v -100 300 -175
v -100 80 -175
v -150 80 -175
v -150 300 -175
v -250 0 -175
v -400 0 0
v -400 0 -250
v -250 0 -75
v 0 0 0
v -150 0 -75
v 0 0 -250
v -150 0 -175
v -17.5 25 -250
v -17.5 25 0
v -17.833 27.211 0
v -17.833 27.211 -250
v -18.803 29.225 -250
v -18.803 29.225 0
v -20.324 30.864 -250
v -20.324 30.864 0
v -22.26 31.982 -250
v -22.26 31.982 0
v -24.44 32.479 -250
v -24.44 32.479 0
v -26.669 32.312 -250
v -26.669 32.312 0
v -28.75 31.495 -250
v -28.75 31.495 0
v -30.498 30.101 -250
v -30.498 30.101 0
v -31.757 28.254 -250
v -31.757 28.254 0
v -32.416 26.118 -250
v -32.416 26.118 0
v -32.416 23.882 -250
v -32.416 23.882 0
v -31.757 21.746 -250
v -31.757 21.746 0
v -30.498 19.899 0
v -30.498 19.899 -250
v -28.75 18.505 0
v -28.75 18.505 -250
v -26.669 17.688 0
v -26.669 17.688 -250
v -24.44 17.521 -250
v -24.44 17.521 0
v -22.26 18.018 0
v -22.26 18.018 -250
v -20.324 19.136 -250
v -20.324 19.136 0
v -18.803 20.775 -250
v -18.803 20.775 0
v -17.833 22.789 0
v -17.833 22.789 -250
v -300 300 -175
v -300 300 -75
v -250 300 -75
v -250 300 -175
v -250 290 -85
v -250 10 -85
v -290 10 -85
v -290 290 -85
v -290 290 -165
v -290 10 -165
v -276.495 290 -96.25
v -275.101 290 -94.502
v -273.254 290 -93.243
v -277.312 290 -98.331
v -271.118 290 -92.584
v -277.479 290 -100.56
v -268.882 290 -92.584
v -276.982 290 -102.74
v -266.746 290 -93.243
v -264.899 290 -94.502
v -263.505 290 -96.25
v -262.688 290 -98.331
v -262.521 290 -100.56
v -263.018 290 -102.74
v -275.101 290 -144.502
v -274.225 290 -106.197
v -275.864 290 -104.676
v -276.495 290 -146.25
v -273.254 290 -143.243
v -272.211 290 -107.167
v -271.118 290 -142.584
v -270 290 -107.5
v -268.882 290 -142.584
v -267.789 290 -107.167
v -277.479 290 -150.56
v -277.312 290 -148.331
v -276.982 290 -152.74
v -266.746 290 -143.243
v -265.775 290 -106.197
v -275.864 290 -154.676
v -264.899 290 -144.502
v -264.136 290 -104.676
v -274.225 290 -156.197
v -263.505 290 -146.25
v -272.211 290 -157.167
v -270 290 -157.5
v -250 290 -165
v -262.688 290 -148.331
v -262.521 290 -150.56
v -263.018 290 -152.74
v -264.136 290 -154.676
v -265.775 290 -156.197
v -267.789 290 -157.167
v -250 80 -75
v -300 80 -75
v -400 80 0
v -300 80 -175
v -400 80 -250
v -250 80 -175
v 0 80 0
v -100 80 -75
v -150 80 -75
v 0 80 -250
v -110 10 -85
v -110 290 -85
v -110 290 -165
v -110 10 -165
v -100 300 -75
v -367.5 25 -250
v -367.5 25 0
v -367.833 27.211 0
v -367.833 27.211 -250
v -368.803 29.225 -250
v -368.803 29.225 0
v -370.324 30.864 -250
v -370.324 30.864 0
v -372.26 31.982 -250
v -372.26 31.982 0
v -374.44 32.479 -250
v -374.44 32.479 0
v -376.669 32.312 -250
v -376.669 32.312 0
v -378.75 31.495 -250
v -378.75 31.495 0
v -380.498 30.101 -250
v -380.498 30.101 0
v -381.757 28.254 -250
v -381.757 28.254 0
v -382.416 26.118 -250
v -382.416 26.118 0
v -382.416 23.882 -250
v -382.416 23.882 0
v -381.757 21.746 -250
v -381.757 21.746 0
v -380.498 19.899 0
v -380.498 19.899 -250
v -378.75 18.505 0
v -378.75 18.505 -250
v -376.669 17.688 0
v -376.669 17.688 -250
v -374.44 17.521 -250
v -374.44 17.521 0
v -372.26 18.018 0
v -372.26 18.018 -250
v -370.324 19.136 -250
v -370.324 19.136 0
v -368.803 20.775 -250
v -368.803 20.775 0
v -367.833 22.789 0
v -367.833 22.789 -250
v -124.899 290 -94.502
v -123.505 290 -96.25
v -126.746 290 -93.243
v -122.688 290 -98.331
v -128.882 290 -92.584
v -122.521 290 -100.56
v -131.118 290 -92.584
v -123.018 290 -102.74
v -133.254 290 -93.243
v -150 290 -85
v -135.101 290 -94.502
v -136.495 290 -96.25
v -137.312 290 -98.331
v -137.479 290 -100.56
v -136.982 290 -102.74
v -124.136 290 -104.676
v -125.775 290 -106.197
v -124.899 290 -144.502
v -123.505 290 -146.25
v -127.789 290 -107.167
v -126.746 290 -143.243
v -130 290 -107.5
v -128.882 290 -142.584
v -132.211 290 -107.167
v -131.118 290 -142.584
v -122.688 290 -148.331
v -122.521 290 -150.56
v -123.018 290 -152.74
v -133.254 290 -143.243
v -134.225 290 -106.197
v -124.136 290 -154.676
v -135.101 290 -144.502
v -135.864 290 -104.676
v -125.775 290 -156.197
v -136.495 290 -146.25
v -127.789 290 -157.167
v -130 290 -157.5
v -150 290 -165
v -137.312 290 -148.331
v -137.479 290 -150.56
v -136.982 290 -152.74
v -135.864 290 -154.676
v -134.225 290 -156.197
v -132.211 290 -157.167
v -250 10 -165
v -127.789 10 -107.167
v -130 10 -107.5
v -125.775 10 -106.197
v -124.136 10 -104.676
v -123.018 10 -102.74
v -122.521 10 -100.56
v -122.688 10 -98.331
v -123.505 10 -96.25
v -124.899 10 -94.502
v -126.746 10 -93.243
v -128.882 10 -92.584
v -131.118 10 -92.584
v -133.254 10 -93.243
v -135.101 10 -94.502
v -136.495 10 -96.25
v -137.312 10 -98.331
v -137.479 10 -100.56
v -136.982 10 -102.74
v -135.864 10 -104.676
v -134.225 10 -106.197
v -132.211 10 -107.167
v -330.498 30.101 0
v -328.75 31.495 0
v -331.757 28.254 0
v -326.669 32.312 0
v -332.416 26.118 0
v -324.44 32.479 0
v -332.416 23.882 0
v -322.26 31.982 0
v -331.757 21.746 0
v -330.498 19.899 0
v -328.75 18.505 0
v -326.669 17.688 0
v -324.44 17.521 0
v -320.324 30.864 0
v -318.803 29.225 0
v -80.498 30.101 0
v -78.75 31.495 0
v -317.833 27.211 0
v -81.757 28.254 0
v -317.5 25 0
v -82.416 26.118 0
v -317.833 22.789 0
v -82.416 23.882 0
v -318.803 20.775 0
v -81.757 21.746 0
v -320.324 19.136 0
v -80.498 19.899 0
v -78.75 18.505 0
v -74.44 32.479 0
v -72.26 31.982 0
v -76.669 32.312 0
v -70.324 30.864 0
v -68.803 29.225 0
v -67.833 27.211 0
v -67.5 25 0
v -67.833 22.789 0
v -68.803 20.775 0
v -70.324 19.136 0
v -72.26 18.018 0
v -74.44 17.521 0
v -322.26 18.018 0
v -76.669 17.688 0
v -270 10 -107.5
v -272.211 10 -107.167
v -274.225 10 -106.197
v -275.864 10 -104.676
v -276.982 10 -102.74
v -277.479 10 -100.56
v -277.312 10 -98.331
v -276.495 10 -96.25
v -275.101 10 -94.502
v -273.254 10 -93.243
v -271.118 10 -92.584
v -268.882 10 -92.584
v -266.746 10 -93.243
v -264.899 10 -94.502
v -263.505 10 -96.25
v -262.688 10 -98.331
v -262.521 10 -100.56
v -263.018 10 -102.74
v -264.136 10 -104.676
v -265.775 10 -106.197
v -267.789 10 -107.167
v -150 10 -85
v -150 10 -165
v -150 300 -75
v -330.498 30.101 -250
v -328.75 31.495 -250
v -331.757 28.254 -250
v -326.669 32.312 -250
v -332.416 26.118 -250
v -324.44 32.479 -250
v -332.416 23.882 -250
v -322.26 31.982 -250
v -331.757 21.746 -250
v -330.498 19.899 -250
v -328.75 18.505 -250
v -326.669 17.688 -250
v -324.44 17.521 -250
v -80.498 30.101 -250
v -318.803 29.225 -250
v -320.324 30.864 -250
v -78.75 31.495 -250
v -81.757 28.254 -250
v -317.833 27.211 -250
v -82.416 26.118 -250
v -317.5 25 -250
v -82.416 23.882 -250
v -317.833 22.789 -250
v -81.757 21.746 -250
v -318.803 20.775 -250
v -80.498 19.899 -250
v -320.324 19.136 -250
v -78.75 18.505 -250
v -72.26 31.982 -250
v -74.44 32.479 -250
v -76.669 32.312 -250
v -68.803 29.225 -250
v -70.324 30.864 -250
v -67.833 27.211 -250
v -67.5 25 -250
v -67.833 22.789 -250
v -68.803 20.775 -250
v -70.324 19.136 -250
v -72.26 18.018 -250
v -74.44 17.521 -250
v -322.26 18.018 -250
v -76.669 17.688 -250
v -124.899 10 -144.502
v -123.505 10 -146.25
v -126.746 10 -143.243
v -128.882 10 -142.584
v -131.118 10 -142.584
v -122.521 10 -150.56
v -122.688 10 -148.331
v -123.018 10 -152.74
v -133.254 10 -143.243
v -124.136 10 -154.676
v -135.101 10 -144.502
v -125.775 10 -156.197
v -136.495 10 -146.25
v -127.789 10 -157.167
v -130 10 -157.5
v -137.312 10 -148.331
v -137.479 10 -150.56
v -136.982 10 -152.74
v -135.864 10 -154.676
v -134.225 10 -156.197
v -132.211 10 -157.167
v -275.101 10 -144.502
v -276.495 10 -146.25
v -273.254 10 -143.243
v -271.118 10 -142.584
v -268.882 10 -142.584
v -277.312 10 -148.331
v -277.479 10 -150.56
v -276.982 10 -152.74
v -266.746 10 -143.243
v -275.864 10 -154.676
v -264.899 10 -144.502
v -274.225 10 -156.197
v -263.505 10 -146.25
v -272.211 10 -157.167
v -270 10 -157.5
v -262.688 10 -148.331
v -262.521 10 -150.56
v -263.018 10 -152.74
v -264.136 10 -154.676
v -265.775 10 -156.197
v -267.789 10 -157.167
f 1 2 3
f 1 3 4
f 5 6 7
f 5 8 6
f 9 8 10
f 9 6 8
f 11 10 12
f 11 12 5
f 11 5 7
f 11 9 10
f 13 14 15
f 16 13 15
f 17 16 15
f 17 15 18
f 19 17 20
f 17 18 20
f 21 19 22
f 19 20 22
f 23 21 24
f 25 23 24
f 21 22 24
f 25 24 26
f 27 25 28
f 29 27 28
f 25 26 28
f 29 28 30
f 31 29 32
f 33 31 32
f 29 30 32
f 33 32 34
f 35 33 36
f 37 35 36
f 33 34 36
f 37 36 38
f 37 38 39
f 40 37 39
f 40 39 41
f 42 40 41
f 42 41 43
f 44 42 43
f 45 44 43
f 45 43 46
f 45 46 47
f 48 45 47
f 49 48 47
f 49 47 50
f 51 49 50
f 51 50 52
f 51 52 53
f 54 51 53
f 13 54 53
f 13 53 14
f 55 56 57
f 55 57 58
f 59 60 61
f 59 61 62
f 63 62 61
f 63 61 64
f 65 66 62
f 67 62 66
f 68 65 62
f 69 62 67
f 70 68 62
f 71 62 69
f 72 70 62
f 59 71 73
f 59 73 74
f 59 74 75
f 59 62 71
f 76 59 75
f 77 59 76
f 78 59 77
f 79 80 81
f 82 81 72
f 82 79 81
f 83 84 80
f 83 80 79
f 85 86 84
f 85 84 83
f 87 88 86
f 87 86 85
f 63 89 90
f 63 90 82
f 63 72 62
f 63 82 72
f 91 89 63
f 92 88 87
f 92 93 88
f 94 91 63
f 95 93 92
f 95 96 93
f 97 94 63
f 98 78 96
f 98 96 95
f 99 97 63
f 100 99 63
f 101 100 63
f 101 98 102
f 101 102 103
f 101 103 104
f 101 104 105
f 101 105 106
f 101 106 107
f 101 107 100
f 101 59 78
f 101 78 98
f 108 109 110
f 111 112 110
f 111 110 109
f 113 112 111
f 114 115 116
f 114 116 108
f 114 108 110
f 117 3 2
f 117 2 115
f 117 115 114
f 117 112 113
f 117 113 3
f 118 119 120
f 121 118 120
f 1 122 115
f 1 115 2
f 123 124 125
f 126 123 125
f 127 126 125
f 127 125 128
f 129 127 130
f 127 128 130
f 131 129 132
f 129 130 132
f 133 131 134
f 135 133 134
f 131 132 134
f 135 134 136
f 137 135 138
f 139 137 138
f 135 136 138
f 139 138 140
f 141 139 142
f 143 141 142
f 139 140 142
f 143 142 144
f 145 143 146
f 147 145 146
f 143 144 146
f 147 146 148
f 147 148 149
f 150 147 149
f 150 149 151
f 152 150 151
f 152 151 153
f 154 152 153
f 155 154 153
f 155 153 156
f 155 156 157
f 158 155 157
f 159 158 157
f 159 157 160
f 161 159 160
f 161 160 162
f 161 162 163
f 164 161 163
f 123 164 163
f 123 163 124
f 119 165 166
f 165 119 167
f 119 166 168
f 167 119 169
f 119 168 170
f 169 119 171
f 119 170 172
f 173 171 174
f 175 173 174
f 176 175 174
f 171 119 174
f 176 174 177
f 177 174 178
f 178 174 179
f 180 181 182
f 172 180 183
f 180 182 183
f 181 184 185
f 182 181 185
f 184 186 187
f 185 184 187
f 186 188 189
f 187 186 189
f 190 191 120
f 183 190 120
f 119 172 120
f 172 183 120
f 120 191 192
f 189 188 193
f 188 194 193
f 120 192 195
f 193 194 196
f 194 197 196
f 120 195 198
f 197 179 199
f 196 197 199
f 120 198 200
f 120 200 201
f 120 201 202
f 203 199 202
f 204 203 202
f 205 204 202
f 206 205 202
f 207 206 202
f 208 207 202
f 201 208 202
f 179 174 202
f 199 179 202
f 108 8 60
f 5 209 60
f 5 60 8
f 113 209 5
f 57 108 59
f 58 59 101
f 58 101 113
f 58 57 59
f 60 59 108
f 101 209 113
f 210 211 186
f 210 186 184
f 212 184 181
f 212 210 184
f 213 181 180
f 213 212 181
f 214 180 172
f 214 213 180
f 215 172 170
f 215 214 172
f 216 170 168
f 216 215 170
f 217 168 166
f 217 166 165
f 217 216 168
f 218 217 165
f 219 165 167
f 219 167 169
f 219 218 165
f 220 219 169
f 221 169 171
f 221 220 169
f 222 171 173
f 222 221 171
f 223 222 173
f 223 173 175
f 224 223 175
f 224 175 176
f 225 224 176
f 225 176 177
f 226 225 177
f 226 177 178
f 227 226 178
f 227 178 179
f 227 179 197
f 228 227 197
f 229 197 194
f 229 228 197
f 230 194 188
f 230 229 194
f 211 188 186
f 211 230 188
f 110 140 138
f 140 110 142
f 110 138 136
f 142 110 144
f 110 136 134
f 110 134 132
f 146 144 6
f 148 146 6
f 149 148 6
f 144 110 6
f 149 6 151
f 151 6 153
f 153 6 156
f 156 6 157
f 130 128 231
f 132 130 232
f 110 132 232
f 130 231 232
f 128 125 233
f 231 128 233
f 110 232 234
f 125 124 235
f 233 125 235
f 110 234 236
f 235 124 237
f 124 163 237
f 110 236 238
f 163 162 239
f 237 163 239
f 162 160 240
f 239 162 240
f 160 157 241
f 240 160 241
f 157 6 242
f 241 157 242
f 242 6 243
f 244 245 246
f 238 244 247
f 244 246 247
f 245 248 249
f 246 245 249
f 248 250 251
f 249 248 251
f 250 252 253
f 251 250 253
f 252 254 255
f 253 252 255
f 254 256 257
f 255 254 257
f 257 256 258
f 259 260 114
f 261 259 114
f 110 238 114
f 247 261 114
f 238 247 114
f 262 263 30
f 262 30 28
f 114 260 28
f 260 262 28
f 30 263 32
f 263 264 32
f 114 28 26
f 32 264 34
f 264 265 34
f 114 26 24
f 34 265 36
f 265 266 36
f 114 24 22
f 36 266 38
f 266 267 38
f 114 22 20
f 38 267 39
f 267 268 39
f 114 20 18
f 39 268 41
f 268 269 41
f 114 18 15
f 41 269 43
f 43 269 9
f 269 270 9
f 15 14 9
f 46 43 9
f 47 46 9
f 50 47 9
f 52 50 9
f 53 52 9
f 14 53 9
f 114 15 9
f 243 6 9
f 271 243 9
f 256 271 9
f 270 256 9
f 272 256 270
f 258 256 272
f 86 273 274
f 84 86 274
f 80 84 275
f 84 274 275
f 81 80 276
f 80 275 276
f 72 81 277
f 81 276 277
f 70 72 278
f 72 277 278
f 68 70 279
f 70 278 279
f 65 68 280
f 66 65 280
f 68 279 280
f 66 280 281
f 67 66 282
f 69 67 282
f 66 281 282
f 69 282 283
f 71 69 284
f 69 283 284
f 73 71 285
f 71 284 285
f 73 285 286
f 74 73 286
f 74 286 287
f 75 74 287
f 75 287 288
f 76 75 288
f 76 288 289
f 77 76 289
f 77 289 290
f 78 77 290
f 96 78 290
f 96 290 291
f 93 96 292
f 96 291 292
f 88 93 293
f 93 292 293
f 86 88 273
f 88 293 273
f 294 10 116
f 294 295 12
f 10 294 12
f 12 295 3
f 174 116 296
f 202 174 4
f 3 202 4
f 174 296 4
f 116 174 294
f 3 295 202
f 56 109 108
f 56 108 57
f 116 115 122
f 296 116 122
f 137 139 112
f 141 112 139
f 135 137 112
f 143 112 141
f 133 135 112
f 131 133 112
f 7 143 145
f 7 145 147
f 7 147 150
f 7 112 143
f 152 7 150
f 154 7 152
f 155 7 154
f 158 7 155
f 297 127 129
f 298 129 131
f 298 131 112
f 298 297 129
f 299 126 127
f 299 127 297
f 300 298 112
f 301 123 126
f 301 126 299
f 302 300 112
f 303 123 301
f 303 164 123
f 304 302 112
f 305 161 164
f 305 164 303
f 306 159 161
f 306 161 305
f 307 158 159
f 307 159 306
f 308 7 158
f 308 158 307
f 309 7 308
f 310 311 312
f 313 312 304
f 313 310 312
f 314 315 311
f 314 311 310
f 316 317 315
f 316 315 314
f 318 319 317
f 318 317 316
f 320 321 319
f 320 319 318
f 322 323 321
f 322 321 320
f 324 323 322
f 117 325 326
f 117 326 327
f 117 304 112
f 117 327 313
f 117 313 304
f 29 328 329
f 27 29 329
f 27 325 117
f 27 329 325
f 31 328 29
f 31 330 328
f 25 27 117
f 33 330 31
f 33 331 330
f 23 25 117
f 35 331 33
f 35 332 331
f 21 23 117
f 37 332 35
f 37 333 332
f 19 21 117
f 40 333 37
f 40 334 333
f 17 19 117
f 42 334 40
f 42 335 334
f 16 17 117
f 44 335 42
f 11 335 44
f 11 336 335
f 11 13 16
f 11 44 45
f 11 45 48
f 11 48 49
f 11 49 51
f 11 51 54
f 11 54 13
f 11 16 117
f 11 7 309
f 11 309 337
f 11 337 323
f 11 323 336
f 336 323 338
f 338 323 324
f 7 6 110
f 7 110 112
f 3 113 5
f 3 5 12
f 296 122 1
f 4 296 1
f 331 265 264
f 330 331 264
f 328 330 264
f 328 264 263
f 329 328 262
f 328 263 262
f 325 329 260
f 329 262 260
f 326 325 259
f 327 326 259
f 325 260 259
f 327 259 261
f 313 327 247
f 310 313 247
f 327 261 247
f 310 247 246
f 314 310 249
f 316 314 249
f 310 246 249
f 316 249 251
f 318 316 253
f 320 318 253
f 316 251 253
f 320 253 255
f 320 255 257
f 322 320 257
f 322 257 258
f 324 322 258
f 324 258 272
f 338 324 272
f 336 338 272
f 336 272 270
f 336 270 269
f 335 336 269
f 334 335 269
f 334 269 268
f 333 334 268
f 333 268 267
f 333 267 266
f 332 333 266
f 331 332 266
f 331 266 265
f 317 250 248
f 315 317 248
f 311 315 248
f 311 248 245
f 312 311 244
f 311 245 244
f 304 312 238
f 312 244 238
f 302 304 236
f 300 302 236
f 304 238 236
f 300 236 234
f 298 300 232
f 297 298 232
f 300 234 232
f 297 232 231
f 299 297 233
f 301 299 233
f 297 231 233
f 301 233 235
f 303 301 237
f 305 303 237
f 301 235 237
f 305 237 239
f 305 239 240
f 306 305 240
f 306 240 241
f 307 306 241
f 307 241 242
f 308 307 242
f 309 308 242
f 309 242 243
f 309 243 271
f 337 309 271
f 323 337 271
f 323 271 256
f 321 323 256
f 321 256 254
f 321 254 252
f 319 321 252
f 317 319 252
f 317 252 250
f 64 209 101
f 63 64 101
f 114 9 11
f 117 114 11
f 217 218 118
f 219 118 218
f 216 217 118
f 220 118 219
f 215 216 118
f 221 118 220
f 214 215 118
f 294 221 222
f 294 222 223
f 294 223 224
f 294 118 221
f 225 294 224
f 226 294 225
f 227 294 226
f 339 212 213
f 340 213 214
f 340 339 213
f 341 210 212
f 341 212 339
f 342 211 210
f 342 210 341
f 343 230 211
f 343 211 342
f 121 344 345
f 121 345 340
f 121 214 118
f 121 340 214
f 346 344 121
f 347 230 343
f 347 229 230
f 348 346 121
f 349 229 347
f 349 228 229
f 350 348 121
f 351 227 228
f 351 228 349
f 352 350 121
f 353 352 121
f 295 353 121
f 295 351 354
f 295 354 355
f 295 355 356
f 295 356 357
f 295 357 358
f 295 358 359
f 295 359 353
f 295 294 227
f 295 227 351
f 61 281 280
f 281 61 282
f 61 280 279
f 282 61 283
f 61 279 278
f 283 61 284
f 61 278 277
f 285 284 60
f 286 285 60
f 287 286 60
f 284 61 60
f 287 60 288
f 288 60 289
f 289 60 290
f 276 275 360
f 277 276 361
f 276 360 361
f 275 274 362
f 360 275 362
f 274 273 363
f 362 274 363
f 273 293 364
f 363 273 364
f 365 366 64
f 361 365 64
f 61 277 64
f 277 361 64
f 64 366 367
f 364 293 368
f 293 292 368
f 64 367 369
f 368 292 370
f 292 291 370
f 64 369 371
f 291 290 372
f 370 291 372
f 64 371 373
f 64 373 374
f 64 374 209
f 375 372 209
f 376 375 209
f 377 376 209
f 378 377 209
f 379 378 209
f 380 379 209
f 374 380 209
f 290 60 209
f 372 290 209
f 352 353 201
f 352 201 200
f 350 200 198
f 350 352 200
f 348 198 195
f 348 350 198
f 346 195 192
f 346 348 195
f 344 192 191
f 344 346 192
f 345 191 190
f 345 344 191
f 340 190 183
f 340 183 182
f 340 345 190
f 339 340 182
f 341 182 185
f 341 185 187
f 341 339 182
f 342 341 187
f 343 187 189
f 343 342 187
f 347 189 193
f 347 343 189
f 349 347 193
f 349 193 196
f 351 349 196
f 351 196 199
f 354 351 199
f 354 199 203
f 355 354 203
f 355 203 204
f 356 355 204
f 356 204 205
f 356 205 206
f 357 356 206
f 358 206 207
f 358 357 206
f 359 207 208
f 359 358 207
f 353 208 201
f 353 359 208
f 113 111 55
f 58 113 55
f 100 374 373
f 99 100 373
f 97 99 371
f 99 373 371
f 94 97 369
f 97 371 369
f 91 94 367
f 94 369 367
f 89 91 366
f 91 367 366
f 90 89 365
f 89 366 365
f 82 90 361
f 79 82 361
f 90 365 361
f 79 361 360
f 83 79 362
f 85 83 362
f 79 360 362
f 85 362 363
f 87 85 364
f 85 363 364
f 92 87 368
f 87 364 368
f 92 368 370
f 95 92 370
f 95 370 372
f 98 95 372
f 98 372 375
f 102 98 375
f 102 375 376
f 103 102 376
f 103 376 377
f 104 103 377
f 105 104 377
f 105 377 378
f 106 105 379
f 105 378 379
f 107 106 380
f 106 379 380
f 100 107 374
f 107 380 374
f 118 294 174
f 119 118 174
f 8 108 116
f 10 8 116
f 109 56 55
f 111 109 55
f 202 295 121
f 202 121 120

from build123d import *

# Parameters (mm, degrees)
SKETCH1_W           = 400
SKETCH1_H           = 250
BOSS_EXTRUDE1_DEPTH = 80
SKETCH2_R           = 7.5
CUT_EXTRUDE1_DEPTH  = 479.434948556
SKETCH5_W           = 200
SKETCH5_H           = 100
CUT_EXTRUDE2_DEPTH  = 479.434948556
SKETCH8_W           = 100
SKETCH8_H           = 300
BOSS_EXTRUDE2_DEPTH = 50
SKETCH9_W           = 80
SKETCH9_H           = 280
CUT_EXTRUDE3_DEPTH  = 40
SKETCH10_R          = 7.5
BOSS_EXTRUDE3_DEPTH = 280


with BuildPart() as part:
    # Sketch1 → Boss-Extrude1 (new body)
    with BuildSketch(Plane(origin=(0, 0, 0), x_dir=(1, 0, 0), z_dir=(0, 1, 0))):
        with Locations((-200, 125)):
            Rectangle(SKETCH1_W, SKETCH1_H)
    extrude(amount=BOSS_EXTRUDE1_DEPTH)

    # Sketch2 → Cut-Extrude1 (cut, through all)
    with BuildSketch(Plane.XY):
        with Locations((-375, 25)):
            Circle(SKETCH2_R)
        with Locations((-325, 25)):
            Circle(SKETCH2_R)
        with Locations((-75, 25)):
            Circle(SKETCH2_R)
        with Locations((-25, 25)):
            Circle(SKETCH2_R)
    extrude(amount=-CUT_EXTRUDE1_DEPTH, mode=Mode.SUBTRACT)

    # Sketch5 → Cut-Extrude2 (cut, through all)
    with BuildSketch(Plane(origin=(0, 80, 0), x_dir=(1, 0, 0), z_dir=(0, 1, 0))):
        with Locations((-200, 125)):
            Rectangle(SKETCH5_W, SKETCH5_H)
    extrude(amount=-CUT_EXTRUDE2_DEPTH, mode=Mode.SUBTRACT)

    # Sketch8 → Boss-Extrude2 (add)
    with BuildSketch(Plane(origin=(-300, 0, 0), x_dir=(0, 0, -1), z_dir=(1, 0, 0))):
        with Locations((125, 150)):
            Rectangle(SKETCH8_W, SKETCH8_H)
    boss_extrude2 = extrude(amount=BOSS_EXTRUDE2_DEPTH)

    # Sketch9 → Cut-Extrude3 (cut)
    with BuildSketch(Plane(origin=(-250, 0, 0), x_dir=(0, 0, -1), z_dir=(1, 0, 0))):
        with Locations((125, 150)):
            Rectangle(SKETCH9_W, SKETCH9_H)
    cut_extrude3 = extrude(amount=-CUT_EXTRUDE3_DEPTH, mode=Mode.SUBTRACT)

    # Mirror1: Boss-Extrude2, Cut-Extrude3 across plane
    add(boss_extrude2.mirror(Plane.ZY.offset(200)))
    add(cut_extrude3.mirror(Plane.ZY.offset(200)), mode=Mode.SUBTRACT)

    # Sketch10 → Boss-Extrude3 (add)
    with BuildSketch(Plane(origin=(0, 10, 0), x_dir=(1, 0, 0), z_dir=(0, 1, 0))):
        with Locations(Location((-270, 150, 0), (0, 0, 90))):
            Circle(SKETCH10_R)
        with Locations(Location((-270, 100, 0), (0, 0, 90))):
            Circle(SKETCH10_R)
    boss_extrude3 = extrude(amount=BOSS_EXTRUDE3_DEPTH)

    # Mirror2: Boss-Extrude3 across plane
    add(boss_extrude3.mirror(Plane.ZY.offset(200)))


solid = part.part
